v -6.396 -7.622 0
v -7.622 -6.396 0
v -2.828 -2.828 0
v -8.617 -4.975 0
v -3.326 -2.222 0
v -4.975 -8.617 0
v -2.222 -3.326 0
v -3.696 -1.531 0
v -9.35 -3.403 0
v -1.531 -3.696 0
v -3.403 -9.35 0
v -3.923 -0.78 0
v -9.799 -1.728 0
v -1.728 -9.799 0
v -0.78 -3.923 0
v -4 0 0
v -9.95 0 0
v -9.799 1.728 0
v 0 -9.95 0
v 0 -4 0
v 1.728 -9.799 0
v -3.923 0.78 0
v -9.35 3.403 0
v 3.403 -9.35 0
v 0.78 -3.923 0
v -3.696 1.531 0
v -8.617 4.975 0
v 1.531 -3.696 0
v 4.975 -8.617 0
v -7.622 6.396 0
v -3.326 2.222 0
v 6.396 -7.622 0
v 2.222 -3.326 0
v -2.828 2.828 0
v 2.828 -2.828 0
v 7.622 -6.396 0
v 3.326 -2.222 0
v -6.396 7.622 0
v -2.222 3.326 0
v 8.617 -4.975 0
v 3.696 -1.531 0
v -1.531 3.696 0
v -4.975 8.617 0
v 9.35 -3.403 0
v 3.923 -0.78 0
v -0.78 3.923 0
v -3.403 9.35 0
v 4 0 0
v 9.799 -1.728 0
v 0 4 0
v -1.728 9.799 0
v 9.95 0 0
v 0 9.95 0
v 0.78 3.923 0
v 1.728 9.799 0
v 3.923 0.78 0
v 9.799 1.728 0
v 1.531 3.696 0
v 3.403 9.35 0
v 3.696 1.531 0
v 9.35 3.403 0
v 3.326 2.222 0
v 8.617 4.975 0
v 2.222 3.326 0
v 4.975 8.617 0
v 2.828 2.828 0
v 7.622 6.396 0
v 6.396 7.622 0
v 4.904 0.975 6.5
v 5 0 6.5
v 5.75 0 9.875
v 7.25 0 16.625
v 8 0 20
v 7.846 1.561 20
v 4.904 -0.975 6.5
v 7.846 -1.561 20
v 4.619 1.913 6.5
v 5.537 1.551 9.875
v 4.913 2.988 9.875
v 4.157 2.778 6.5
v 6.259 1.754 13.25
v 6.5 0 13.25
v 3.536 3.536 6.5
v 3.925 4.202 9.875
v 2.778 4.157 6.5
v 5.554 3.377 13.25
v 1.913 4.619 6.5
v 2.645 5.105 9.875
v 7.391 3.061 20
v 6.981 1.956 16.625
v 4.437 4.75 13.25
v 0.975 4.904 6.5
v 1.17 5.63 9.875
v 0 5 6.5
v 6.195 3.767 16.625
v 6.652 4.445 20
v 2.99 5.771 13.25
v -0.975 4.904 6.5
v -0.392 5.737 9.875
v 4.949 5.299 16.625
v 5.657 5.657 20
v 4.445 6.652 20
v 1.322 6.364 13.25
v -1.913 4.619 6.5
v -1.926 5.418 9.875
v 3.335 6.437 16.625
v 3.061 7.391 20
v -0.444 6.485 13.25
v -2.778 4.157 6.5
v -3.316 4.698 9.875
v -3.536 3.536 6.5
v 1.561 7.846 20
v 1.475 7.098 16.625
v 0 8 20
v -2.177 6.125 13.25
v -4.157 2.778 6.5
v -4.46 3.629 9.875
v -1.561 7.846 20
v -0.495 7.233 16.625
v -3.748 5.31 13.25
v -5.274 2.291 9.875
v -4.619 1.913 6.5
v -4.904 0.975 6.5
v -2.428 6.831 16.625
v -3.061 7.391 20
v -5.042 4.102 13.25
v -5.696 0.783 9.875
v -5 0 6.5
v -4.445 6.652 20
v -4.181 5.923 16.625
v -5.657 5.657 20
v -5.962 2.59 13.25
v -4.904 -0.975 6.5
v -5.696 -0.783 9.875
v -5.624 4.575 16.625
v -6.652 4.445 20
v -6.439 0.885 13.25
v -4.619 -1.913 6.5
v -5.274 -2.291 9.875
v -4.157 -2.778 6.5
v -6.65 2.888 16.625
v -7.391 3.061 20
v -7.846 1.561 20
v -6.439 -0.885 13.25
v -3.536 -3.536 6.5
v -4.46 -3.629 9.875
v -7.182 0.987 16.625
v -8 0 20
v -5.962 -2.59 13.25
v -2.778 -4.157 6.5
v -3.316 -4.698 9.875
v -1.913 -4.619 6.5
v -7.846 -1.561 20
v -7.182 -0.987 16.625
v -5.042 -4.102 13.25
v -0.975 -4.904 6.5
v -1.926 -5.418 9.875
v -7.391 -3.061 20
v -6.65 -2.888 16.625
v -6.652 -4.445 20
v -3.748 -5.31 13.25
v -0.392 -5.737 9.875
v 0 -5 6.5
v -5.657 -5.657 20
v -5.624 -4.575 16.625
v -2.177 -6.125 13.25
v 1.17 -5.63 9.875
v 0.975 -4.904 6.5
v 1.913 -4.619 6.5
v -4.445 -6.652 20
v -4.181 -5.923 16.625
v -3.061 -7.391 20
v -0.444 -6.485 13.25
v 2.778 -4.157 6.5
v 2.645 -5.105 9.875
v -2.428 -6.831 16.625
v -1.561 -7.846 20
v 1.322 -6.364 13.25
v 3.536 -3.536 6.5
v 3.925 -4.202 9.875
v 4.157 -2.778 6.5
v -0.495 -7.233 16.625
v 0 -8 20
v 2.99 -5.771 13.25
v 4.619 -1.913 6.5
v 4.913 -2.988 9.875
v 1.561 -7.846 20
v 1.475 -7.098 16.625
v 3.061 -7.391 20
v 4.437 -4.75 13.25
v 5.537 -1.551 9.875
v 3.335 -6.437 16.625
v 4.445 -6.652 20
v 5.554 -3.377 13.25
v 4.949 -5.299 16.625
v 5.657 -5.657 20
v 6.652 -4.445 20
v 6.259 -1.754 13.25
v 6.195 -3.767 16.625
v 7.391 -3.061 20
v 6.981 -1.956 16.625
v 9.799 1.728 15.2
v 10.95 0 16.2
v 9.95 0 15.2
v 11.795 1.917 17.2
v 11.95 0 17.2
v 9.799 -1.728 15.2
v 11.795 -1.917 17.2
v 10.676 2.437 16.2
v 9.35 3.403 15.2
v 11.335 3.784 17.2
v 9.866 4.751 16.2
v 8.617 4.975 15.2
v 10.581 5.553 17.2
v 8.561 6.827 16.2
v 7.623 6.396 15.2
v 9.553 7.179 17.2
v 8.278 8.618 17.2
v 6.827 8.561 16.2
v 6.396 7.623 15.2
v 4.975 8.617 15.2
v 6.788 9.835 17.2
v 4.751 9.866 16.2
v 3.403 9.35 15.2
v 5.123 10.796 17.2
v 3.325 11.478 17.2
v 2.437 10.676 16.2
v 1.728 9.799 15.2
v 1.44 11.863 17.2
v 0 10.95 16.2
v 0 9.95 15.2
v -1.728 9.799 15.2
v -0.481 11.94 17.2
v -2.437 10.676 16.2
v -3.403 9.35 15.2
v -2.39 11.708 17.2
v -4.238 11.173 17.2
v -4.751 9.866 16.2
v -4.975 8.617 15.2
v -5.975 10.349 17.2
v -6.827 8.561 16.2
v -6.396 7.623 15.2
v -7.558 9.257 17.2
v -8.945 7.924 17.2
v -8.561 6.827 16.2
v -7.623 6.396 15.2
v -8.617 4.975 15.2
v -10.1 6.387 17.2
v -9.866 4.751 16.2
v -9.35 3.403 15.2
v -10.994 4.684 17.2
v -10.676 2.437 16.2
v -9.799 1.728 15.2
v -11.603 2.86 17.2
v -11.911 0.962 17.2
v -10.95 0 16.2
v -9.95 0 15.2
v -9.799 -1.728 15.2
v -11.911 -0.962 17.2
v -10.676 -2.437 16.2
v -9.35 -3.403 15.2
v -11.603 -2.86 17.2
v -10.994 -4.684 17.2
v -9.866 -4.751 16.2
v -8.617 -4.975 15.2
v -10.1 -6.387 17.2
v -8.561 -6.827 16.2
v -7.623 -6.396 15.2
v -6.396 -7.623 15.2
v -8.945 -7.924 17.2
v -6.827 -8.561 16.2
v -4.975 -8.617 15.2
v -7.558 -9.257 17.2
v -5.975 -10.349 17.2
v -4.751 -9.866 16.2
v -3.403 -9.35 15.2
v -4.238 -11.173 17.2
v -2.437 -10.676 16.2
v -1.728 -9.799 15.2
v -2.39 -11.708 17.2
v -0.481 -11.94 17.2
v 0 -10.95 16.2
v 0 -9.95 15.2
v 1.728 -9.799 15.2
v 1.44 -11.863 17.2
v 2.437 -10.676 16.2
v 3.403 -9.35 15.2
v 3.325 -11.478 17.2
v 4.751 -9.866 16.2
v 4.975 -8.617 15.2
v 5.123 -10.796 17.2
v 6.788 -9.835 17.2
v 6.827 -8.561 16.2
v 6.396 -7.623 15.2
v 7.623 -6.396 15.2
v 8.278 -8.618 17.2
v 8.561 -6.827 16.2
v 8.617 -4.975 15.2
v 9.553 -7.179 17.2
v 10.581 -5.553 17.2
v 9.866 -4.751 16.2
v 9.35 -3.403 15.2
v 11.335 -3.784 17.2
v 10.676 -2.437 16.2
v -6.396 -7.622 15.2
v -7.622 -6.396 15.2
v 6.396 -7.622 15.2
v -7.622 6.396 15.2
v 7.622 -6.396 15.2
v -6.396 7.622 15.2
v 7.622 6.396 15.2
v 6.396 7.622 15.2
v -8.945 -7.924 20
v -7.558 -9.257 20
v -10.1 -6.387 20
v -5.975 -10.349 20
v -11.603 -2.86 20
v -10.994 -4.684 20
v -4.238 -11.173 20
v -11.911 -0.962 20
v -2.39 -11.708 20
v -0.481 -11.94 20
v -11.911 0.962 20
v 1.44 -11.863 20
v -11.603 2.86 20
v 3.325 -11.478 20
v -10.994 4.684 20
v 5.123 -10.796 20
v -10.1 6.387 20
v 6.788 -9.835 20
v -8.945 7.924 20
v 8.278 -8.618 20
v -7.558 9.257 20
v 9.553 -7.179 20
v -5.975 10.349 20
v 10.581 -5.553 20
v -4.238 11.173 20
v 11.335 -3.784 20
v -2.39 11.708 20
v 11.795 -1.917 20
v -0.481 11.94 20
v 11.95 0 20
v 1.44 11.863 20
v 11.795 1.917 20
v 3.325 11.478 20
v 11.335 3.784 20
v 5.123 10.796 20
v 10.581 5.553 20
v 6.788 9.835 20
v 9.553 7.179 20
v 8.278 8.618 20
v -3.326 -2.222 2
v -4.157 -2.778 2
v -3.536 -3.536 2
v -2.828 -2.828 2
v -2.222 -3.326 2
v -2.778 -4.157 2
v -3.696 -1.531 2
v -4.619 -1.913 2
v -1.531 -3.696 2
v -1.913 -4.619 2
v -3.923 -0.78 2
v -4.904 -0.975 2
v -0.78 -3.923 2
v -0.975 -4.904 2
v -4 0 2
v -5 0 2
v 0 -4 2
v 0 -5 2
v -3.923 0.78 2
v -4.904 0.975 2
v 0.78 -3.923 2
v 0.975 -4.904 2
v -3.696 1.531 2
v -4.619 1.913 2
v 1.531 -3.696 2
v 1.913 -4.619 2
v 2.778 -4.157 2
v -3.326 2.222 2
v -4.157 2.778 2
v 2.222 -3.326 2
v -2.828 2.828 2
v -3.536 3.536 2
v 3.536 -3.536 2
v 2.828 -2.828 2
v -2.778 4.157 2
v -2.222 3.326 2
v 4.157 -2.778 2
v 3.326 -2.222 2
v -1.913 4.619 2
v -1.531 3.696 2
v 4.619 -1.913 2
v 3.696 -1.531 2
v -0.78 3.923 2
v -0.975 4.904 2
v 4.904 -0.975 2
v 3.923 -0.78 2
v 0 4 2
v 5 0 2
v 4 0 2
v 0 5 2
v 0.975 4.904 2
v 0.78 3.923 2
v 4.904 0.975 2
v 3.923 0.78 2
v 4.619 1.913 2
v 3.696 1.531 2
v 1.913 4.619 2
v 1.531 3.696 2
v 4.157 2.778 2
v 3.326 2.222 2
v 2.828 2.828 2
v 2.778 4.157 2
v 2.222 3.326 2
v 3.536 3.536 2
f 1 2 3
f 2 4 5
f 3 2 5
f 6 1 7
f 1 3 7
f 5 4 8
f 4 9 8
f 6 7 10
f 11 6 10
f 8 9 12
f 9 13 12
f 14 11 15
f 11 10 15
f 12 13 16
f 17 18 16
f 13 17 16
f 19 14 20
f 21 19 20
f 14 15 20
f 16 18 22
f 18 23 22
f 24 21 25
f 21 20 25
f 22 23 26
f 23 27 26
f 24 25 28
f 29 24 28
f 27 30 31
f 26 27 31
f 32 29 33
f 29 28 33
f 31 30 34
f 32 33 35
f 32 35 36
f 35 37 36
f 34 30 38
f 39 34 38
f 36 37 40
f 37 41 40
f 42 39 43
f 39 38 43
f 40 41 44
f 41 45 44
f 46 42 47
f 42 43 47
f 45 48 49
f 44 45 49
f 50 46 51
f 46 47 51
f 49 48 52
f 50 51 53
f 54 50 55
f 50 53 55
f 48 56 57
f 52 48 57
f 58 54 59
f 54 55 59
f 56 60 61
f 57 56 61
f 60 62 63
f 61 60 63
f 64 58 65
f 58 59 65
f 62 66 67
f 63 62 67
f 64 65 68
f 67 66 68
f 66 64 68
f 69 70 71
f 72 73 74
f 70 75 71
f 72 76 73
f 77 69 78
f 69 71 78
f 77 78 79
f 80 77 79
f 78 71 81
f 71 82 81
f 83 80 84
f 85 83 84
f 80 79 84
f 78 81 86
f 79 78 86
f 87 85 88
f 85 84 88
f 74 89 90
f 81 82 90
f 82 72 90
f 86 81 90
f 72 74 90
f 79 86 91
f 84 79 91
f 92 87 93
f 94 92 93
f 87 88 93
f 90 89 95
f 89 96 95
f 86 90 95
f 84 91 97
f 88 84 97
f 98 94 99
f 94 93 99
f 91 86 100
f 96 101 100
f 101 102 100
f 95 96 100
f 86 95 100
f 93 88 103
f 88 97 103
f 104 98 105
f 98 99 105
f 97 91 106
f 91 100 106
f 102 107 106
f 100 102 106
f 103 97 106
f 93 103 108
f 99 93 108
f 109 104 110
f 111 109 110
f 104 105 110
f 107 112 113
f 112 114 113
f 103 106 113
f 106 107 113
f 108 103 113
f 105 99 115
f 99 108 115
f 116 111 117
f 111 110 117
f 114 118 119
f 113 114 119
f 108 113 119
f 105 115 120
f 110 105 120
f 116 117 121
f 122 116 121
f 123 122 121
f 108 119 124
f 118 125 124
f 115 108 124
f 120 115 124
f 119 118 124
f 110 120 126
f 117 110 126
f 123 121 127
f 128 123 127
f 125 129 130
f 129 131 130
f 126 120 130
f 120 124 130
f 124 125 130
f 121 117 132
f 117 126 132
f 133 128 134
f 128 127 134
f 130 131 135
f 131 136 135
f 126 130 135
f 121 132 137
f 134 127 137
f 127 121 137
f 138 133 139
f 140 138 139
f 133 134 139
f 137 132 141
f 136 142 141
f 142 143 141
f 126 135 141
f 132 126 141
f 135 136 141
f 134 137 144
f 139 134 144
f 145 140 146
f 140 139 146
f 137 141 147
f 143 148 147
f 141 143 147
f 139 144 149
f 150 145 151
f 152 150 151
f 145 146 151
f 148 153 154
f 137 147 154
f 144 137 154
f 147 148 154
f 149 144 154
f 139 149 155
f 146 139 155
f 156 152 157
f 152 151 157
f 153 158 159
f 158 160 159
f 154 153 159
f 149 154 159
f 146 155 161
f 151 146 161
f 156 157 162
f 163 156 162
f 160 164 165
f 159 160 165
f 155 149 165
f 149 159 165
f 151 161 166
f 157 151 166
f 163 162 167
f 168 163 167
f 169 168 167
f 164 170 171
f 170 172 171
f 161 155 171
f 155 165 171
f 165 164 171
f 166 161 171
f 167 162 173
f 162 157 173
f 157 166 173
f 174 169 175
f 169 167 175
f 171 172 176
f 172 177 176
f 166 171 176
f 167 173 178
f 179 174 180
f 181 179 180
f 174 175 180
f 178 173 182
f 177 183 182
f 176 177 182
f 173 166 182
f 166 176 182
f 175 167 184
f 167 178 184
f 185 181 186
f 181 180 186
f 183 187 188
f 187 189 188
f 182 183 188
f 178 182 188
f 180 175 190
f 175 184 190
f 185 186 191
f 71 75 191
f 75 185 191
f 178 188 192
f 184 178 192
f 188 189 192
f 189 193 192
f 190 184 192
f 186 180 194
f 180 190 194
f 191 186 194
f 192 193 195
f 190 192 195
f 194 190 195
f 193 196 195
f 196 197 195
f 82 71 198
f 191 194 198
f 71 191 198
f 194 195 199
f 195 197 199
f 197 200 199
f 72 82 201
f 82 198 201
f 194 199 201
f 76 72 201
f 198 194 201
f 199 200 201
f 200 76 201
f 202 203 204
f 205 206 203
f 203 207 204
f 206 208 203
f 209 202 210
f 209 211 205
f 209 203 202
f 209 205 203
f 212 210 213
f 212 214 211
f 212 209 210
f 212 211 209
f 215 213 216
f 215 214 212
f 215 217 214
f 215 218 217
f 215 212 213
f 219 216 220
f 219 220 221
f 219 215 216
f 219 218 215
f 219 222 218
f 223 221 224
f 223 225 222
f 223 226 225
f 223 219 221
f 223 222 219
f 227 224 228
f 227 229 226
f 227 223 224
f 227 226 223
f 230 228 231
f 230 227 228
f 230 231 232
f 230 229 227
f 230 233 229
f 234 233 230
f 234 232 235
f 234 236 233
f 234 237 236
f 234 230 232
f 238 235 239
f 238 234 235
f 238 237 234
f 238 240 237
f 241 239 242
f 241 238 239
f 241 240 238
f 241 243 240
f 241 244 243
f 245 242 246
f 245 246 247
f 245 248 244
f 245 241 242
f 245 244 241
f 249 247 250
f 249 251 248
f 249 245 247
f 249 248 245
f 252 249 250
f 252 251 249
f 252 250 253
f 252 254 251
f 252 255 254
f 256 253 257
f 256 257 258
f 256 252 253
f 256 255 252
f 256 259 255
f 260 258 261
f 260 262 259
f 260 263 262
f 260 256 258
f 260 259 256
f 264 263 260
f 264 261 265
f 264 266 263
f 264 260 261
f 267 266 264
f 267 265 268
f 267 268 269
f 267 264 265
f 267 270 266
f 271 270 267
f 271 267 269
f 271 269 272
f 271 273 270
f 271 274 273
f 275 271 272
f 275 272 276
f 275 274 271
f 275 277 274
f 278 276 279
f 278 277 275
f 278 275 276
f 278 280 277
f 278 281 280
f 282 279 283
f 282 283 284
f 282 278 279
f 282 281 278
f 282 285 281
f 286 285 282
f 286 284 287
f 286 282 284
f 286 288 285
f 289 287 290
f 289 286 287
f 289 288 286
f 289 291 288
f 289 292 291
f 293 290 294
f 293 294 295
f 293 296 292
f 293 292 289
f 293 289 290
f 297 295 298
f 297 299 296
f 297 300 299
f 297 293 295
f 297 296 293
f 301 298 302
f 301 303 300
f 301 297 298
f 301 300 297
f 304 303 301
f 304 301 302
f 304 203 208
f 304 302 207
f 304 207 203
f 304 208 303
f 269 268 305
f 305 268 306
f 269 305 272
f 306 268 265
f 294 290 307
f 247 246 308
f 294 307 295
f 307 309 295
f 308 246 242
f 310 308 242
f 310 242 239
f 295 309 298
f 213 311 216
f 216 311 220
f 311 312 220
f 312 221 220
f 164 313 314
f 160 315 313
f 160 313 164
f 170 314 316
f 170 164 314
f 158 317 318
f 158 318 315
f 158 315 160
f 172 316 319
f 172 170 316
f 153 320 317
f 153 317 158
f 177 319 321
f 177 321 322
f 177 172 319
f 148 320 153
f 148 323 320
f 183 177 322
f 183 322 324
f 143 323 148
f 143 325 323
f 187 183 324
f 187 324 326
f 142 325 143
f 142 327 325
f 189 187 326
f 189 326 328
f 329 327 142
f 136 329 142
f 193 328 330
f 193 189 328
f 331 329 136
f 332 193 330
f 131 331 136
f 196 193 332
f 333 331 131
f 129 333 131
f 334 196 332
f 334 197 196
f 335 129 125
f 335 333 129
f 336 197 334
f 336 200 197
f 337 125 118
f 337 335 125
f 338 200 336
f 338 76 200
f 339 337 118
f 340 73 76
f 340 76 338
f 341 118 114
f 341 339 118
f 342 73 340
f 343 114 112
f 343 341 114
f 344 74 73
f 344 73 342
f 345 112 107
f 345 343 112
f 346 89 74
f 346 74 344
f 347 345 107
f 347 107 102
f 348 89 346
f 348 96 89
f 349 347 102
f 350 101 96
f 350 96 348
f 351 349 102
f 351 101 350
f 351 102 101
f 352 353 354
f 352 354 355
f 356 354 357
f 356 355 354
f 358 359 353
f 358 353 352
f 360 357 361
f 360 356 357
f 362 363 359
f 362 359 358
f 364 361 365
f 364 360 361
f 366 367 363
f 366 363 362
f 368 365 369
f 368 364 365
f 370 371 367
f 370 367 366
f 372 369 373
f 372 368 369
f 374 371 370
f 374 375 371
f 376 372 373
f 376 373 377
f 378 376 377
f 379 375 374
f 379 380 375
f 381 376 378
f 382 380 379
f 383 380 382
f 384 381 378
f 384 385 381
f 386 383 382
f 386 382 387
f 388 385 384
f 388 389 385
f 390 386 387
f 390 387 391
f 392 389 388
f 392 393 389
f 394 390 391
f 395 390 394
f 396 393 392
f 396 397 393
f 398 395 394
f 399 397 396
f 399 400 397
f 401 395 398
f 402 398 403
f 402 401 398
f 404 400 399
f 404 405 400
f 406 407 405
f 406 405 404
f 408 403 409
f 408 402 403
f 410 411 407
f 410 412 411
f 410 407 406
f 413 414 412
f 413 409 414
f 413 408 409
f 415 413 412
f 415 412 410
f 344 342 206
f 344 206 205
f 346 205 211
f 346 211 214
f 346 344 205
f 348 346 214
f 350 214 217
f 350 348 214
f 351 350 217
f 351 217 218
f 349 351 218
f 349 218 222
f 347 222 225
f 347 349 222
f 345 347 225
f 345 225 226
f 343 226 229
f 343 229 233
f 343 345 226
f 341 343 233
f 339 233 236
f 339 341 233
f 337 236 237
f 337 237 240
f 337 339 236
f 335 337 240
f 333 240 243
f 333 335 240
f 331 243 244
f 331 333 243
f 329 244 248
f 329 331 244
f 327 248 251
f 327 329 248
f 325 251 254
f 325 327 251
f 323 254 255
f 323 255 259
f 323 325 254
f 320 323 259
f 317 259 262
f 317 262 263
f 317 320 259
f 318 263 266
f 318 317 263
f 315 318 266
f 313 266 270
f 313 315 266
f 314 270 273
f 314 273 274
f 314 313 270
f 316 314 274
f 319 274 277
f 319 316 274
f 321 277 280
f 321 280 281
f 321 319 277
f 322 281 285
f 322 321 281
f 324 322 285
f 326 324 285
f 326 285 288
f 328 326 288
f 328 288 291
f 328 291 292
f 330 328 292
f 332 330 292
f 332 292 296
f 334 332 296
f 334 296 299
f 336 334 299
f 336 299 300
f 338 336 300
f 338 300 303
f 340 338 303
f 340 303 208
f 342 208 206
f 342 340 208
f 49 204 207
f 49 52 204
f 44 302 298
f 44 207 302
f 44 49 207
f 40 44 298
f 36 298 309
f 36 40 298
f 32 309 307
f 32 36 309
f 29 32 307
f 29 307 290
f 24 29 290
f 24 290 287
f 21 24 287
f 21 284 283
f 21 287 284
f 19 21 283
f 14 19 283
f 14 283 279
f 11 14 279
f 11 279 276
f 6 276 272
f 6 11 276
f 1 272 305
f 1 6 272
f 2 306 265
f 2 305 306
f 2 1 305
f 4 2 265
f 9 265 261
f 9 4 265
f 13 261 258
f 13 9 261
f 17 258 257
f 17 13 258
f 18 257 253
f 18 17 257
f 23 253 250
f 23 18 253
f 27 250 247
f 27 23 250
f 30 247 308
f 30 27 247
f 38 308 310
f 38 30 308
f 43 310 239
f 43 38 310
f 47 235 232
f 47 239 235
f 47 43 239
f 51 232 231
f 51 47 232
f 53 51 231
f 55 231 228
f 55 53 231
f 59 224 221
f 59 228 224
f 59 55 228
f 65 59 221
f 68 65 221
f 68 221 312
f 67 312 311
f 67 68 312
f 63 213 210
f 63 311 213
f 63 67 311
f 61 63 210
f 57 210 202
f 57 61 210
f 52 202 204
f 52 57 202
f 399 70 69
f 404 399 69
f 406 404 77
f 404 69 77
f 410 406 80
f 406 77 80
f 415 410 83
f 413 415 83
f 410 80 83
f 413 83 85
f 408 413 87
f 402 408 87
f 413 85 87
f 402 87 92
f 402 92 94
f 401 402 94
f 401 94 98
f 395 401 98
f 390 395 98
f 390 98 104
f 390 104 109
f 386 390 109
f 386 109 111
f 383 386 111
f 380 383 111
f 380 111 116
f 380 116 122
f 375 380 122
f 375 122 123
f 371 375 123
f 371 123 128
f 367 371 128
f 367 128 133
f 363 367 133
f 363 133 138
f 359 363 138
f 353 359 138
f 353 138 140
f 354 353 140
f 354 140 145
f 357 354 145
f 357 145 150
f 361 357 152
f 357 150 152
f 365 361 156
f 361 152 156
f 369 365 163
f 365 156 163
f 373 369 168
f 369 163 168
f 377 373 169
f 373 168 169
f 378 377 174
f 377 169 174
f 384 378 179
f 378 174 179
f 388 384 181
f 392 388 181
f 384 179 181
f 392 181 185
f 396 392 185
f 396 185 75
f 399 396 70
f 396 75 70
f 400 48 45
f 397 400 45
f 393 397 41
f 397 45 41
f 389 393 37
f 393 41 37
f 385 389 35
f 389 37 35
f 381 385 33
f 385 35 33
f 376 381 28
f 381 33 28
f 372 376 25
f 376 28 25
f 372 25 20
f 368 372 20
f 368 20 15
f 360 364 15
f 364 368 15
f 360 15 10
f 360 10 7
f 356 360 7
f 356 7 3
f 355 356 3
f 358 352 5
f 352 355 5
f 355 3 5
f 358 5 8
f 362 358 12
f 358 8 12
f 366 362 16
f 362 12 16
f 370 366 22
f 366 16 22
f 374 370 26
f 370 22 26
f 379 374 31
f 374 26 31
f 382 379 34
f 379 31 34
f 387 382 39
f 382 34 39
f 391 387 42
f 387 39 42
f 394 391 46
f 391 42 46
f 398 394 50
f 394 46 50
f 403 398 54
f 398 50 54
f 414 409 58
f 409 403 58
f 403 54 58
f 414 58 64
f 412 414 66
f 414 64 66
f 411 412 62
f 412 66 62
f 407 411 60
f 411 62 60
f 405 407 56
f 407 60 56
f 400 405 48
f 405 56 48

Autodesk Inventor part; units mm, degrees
ref_plane "YZ Plane" through (0, 0, 0) normal (1, 0, 0) x (0, 1, 0)
ref_plane "XZ Plane" through (0, 0, 0) normal (0, 1, 0) x (-1, 0, 0)
ref_plane "XY Plane" through (0, 0, 0) normal (0, 0, 1) x (1, 0, 0)
sketch "Sketch1" plane through (0, 0, 0) normal (0, 0, 1) x (1, 0, 0)
  circle A0 centre (0, 0) radius 9.95
  circle A1 centre (0, 0) radius 4
  dimension "d0" = 19.9
  dimension "d1" = 8
extrude "Extrusion1" add sketch "Sketch1" along normal blind 20
sketch "Sketch2" plane through (0, 0, 20) normal (0, 0, 1) x (1, 0, 0)
  circle A0 centre (0, 0) radius 9.95 projected
  circle A1 centre (0, 0) radius 11.95
  dimension "d4" = 23.9
extrude "Extrusion2" add sketch "Sketch2" against normal blind 4.8
chamfer "Chamfer1" distance 2 angle 45 1 edges at (-11.95, 0, 15.2)
sketch "Sketch3" plane through (0, 0, 20) normal (0, 0, 1) x (1, 0, 0)
  circle A0 centre (0, 0) radius 4 projected
  circle A1 centre (0, 0) radius 5
  dimension "d10" = 10
extrude "Extrusion3" cut sketch "Sketch3" against normal blind 18
chamfer "Chamfer2" distance 3 distance2 13.5 1 edges at (-5, 0, 20) measured on face at (9.5176, -0.9533, 20)
properties part number "V5 Z Bottom Center Spacer"
